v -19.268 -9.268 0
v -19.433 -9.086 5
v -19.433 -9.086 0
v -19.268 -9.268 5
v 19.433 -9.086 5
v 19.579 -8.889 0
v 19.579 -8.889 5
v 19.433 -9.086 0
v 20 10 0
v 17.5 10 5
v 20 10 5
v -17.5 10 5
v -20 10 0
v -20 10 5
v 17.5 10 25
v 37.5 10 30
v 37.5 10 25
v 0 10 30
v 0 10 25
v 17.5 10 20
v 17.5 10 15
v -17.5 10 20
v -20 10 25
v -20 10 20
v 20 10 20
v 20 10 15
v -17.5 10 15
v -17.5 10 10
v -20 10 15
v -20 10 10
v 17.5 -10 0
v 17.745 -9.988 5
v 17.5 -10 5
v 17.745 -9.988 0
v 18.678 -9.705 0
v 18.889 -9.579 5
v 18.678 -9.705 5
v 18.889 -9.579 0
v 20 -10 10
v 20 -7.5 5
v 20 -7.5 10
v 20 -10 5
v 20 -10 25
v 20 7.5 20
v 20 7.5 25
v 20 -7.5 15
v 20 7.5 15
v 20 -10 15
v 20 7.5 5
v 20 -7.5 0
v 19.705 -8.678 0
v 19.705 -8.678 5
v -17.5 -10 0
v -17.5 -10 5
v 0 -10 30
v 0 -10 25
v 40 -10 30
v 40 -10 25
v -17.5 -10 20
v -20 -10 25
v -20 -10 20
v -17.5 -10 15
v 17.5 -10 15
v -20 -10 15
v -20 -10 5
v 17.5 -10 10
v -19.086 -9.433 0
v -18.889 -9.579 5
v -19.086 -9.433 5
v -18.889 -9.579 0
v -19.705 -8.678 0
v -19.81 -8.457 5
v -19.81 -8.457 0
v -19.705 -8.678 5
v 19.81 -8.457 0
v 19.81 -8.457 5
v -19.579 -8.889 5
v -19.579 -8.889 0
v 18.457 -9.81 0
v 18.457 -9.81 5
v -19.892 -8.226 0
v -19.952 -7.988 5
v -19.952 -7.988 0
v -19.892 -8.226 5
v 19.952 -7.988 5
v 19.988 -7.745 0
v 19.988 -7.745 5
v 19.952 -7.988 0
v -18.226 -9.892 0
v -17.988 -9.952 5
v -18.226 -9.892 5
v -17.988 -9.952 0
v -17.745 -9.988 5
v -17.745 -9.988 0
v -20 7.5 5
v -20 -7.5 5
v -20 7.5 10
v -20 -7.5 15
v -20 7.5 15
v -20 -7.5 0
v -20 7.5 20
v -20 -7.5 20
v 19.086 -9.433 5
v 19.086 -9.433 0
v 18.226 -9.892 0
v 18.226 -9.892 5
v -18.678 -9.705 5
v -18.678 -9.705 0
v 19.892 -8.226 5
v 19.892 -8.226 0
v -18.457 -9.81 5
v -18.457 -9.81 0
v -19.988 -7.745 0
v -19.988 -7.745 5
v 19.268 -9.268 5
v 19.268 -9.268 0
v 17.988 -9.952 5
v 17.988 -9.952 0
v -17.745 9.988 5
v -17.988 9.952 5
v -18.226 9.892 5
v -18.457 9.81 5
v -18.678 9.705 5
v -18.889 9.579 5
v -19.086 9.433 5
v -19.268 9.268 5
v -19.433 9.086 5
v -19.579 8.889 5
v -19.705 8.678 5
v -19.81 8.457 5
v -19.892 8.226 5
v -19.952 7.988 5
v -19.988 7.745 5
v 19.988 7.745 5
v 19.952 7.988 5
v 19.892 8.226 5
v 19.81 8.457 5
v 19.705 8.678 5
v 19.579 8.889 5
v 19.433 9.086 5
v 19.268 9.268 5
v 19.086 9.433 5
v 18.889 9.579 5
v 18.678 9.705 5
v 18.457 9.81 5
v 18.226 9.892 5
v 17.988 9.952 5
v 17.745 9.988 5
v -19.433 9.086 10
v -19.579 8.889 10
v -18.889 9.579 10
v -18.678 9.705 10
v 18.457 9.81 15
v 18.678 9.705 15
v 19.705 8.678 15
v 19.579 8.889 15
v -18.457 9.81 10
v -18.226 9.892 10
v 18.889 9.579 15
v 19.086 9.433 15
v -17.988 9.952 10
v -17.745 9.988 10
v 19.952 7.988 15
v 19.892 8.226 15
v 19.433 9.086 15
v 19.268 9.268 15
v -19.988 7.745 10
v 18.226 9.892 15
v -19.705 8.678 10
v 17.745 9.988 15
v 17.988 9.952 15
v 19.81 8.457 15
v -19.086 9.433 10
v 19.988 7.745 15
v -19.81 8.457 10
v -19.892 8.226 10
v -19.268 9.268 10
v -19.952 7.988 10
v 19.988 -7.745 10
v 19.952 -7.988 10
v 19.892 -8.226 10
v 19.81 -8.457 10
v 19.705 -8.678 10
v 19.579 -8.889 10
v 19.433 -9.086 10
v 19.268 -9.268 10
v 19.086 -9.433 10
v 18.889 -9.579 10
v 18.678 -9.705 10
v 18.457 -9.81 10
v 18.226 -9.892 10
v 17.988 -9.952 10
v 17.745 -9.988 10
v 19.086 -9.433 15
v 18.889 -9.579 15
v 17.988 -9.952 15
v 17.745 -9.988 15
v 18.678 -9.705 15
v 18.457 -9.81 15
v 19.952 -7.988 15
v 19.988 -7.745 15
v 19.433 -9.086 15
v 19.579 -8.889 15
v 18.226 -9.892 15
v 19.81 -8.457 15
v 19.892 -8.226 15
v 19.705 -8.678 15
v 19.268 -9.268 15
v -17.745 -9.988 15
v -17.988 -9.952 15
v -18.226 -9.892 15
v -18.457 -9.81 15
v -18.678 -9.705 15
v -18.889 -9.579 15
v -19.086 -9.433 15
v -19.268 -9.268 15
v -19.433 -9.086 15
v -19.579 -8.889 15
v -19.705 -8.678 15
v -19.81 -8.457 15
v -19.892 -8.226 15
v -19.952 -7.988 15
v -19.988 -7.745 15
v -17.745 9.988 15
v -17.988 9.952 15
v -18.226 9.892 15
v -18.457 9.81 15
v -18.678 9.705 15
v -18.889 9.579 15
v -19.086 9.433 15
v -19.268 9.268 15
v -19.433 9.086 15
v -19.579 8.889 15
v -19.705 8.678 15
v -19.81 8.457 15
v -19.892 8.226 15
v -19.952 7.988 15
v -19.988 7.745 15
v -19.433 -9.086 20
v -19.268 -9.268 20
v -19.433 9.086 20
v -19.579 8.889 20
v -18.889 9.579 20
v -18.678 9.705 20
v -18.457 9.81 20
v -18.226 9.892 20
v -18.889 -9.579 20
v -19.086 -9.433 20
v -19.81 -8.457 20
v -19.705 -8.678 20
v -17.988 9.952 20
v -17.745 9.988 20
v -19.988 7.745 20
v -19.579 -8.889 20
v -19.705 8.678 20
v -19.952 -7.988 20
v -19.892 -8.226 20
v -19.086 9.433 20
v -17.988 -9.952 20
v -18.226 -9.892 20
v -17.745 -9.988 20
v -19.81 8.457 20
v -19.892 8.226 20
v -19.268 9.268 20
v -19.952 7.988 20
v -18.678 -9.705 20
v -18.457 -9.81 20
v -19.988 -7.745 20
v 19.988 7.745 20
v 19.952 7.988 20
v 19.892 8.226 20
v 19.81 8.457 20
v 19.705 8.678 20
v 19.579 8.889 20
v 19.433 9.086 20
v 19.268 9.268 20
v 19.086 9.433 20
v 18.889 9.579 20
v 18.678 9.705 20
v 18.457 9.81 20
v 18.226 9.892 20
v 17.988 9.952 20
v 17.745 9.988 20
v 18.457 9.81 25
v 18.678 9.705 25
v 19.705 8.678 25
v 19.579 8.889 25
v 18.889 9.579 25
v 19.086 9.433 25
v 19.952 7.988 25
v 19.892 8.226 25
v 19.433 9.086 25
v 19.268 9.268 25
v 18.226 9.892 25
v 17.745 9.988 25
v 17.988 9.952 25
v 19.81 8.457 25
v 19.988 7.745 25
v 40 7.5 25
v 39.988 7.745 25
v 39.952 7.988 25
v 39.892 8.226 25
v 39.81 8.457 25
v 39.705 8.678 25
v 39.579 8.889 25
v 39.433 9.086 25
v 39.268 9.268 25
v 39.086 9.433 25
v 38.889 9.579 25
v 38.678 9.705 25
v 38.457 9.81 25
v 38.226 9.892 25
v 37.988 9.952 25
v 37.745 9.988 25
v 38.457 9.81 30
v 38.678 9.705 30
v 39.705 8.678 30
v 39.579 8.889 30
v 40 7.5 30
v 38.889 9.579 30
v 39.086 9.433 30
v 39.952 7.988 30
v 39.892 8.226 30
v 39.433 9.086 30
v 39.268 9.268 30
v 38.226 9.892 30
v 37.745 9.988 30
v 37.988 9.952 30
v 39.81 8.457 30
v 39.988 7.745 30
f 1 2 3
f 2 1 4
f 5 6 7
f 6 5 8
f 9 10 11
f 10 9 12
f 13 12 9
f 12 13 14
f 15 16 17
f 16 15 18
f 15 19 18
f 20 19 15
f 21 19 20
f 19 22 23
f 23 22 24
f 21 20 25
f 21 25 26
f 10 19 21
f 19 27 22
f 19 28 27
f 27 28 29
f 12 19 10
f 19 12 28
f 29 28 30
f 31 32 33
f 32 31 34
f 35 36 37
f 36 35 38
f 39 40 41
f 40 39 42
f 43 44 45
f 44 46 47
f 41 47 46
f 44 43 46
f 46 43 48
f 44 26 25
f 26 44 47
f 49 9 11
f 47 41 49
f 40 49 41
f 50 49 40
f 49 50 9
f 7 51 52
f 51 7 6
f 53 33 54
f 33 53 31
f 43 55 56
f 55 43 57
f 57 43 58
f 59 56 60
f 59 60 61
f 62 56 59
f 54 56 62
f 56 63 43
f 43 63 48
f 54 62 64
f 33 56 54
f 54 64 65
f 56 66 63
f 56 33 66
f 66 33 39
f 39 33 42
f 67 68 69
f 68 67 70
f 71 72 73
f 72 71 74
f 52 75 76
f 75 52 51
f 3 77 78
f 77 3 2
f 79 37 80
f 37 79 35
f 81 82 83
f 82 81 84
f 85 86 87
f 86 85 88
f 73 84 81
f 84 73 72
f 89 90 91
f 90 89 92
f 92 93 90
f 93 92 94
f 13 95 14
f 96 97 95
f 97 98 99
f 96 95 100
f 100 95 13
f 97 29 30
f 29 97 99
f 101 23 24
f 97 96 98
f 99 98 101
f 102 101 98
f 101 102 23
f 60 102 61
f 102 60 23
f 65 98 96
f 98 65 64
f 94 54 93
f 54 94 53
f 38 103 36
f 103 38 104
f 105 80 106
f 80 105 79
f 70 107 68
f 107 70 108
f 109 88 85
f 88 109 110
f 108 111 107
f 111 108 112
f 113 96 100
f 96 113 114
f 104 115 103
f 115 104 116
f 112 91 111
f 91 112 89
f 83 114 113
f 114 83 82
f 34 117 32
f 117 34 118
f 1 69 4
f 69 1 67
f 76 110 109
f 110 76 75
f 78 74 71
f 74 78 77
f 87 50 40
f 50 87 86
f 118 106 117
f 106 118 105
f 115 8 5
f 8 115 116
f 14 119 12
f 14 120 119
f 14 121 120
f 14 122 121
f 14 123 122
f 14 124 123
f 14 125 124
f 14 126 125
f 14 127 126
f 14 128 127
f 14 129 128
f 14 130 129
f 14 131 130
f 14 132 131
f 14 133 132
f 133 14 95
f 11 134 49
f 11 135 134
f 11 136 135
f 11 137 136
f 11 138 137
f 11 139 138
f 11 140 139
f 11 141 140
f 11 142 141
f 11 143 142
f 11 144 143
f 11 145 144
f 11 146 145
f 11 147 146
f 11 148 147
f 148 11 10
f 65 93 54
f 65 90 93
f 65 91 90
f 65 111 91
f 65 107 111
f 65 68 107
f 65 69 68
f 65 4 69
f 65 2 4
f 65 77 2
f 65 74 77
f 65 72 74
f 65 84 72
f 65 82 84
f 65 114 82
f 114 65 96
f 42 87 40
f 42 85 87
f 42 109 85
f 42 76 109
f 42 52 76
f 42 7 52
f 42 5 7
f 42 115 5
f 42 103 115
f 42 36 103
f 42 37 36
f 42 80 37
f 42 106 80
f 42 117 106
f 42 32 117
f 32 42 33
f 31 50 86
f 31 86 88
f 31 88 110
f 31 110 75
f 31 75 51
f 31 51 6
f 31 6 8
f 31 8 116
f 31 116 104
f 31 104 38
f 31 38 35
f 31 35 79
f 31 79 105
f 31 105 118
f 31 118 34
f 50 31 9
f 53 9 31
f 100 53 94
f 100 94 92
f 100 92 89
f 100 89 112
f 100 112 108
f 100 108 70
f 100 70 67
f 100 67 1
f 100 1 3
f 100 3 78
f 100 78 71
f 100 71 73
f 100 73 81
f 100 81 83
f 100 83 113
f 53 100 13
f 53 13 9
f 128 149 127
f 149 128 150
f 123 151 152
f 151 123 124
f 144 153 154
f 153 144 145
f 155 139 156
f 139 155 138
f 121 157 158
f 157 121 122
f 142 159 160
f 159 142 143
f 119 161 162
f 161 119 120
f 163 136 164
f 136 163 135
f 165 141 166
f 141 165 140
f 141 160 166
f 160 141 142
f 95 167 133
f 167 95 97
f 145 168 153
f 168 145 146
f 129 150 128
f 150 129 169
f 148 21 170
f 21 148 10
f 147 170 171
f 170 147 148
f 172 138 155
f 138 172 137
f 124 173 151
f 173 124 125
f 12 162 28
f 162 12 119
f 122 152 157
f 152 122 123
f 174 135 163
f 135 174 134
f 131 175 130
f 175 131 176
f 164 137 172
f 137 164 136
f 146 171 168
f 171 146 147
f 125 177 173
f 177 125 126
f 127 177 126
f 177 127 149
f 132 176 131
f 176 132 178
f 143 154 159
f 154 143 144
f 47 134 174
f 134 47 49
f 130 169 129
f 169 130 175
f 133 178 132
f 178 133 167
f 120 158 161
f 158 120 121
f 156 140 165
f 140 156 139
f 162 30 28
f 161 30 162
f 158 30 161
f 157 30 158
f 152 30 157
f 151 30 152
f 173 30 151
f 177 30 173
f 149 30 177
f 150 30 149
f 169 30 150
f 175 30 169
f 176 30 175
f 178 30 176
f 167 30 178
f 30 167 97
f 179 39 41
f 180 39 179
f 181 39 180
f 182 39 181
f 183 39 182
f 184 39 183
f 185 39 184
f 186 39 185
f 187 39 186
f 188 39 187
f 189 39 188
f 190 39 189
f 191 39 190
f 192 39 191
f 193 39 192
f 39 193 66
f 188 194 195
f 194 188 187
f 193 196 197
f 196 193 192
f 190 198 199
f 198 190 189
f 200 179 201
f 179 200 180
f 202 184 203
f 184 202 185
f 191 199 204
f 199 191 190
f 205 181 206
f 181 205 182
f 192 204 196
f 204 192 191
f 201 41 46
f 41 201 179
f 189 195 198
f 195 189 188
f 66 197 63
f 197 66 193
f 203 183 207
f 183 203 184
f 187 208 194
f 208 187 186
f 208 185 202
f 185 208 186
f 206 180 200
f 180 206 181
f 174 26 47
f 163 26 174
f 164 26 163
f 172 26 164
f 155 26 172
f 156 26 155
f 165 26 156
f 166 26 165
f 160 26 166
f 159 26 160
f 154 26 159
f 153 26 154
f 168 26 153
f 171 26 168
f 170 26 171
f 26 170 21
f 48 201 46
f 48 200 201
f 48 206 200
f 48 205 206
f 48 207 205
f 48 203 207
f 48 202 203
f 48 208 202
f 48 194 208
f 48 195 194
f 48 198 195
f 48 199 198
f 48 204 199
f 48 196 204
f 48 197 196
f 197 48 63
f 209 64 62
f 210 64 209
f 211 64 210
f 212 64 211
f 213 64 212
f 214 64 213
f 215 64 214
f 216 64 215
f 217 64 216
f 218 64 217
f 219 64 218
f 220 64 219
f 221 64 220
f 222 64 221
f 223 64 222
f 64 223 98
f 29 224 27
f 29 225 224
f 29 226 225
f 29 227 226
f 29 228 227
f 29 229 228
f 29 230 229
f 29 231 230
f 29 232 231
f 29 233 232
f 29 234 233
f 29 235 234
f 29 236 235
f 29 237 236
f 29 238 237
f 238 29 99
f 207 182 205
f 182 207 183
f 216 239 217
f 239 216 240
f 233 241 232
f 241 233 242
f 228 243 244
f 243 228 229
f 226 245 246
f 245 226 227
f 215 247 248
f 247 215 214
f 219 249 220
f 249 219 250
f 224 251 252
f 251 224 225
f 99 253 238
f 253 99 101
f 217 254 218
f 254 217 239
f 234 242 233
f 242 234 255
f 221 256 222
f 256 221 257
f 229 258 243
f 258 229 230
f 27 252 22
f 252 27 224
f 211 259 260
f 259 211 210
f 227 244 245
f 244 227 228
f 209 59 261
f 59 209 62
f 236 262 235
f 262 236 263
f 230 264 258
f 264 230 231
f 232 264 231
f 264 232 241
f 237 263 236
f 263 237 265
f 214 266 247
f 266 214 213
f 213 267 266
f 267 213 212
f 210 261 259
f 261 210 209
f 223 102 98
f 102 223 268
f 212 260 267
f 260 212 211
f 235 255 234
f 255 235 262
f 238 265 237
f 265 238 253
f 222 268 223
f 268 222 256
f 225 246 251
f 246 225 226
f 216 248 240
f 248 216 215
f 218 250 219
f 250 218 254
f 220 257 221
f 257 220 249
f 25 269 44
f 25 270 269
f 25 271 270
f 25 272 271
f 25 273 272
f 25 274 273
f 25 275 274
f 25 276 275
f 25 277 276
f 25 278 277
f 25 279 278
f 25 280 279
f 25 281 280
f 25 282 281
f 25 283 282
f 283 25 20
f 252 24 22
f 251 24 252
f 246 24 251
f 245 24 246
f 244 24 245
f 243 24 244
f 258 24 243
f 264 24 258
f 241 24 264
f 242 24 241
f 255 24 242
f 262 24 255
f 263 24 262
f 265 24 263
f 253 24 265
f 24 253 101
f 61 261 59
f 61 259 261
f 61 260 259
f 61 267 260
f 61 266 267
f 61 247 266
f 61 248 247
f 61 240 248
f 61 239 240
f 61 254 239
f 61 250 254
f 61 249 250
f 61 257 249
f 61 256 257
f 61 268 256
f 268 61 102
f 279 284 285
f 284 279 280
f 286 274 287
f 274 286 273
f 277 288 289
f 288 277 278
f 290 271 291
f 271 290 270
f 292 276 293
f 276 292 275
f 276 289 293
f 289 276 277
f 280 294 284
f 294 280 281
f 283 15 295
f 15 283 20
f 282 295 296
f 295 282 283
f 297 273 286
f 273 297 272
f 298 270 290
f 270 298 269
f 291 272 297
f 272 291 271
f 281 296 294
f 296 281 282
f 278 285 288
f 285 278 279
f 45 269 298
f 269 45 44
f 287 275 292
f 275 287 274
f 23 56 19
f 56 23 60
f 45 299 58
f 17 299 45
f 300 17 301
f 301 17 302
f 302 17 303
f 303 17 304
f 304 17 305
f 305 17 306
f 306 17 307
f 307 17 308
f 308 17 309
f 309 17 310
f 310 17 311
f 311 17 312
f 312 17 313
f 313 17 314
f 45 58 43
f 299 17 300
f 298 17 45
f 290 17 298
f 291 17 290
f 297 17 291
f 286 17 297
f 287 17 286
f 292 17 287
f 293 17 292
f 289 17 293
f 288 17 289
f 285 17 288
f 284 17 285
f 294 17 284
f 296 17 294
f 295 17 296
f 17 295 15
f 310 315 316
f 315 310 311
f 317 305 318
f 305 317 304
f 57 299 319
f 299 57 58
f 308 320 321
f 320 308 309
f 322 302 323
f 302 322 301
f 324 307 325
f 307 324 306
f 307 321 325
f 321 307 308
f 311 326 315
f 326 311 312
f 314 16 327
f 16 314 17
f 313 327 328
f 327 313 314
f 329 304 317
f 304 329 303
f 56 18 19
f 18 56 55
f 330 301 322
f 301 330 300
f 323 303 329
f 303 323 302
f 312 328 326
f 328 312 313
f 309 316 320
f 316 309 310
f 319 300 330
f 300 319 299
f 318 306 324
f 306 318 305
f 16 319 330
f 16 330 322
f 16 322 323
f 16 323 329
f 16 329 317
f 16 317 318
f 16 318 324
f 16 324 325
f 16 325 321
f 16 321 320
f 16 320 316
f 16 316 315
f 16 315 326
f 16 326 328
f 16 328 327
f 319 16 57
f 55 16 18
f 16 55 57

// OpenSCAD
module RcubeFlatEdge(){
  union(){
    translate([-20, -10, 0])color("yellow")union()union(){
            translate([2.5, 2.5, 0])hull(){
                cylinder(d=5,h=5,$fn=64);
                translate([35, 0, 0])cylinder(d=5,h=5,$fn=64);
                translate([0, 15, 0])cylinder(d=5,h=5,$fn=64);
                translate([35, 15, 0])cylinder(d=5,h=5,$fn=64);
              }

            translate([0, 10, 0])cube([40, 10, 5]);
          }

    translate([-20, -10, 5])color("orange")union()union(){
            translate([2.5, 2.5, 0])hull(){
                cylinder(d=5,h=5,$fn=64);
                translate([35, 0, 0])cylinder(d=5,h=5,$fn=64);
                translate([0, 15, 0])cylinder(d=5,h=5,$fn=64);
                translate([35, 15, 0])cylinder(d=5,h=5,$fn=64);
              }

            cube([40, 10, 5]);
          }

    translate([-20, -10, 10])color("red")union()union(){
            translate([2.5, 2.5, 0])hull(){
                cylinder(d=5,h=5,$fn=64);
                translate([35, 0, 0])cylinder(d=5,h=5,$fn=64);
                translate([0, 15, 0])cylinder(d=5,h=5,$fn=64);
                translate([35, 15, 0])cylinder(d=5,h=5,$fn=64);
              }

            cube([20, 20, 5]);
          }

    translate([-20, -10, 15])color("pink")union()union(){
            translate([2.5, 2.5, 0])hull(){
                cylinder(d=5,h=5,$fn=64);
                translate([35, 0, 0])cylinder(d=5,h=5,$fn=64);
                translate([0, 15, 0])cylinder(d=5,h=5,$fn=64);
                translate([35, 15, 0])cylinder(d=5,h=5,$fn=64);
              }

            translate([20, 0, 0])cube([20, 20, 5]);
          }

    translate([-20, -10, 20])color("purple")union()union(){
            translate([2.5, 2.5, 0])hull(){
                cylinder(d=5,h=5,$fn=64);
                translate([35, 0, 0])cylinder(d=5,h=5,$fn=64);
                translate([0, 15, 0])cylinder(d=5,h=5,$fn=64);
                translate([35, 15, 0])cylinder(d=5,h=5,$fn=64);
              }

            cube([20, 20, 5]);
            cube([40, 10, 5]);
          }

    translate([0, -10, 25])color("blue")union()union(){
            translate([2.5, 2.5, 0])hull(){
                cylinder(d=5,h=5,$fn=64);
                translate([35, 0, 0])cylinder(d=5,h=5,$fn=64);
                translate([0, 15, 0])cylinder(d=5,h=5,$fn=64);
                translate([35, 15, 0])cylinder(d=5,h=5,$fn=64);
              }

            cube([20, 20, 5]);
            cube([40, 10, 5]);
          }

  }
}
$fn=64;
RcubeFlatEdge();
